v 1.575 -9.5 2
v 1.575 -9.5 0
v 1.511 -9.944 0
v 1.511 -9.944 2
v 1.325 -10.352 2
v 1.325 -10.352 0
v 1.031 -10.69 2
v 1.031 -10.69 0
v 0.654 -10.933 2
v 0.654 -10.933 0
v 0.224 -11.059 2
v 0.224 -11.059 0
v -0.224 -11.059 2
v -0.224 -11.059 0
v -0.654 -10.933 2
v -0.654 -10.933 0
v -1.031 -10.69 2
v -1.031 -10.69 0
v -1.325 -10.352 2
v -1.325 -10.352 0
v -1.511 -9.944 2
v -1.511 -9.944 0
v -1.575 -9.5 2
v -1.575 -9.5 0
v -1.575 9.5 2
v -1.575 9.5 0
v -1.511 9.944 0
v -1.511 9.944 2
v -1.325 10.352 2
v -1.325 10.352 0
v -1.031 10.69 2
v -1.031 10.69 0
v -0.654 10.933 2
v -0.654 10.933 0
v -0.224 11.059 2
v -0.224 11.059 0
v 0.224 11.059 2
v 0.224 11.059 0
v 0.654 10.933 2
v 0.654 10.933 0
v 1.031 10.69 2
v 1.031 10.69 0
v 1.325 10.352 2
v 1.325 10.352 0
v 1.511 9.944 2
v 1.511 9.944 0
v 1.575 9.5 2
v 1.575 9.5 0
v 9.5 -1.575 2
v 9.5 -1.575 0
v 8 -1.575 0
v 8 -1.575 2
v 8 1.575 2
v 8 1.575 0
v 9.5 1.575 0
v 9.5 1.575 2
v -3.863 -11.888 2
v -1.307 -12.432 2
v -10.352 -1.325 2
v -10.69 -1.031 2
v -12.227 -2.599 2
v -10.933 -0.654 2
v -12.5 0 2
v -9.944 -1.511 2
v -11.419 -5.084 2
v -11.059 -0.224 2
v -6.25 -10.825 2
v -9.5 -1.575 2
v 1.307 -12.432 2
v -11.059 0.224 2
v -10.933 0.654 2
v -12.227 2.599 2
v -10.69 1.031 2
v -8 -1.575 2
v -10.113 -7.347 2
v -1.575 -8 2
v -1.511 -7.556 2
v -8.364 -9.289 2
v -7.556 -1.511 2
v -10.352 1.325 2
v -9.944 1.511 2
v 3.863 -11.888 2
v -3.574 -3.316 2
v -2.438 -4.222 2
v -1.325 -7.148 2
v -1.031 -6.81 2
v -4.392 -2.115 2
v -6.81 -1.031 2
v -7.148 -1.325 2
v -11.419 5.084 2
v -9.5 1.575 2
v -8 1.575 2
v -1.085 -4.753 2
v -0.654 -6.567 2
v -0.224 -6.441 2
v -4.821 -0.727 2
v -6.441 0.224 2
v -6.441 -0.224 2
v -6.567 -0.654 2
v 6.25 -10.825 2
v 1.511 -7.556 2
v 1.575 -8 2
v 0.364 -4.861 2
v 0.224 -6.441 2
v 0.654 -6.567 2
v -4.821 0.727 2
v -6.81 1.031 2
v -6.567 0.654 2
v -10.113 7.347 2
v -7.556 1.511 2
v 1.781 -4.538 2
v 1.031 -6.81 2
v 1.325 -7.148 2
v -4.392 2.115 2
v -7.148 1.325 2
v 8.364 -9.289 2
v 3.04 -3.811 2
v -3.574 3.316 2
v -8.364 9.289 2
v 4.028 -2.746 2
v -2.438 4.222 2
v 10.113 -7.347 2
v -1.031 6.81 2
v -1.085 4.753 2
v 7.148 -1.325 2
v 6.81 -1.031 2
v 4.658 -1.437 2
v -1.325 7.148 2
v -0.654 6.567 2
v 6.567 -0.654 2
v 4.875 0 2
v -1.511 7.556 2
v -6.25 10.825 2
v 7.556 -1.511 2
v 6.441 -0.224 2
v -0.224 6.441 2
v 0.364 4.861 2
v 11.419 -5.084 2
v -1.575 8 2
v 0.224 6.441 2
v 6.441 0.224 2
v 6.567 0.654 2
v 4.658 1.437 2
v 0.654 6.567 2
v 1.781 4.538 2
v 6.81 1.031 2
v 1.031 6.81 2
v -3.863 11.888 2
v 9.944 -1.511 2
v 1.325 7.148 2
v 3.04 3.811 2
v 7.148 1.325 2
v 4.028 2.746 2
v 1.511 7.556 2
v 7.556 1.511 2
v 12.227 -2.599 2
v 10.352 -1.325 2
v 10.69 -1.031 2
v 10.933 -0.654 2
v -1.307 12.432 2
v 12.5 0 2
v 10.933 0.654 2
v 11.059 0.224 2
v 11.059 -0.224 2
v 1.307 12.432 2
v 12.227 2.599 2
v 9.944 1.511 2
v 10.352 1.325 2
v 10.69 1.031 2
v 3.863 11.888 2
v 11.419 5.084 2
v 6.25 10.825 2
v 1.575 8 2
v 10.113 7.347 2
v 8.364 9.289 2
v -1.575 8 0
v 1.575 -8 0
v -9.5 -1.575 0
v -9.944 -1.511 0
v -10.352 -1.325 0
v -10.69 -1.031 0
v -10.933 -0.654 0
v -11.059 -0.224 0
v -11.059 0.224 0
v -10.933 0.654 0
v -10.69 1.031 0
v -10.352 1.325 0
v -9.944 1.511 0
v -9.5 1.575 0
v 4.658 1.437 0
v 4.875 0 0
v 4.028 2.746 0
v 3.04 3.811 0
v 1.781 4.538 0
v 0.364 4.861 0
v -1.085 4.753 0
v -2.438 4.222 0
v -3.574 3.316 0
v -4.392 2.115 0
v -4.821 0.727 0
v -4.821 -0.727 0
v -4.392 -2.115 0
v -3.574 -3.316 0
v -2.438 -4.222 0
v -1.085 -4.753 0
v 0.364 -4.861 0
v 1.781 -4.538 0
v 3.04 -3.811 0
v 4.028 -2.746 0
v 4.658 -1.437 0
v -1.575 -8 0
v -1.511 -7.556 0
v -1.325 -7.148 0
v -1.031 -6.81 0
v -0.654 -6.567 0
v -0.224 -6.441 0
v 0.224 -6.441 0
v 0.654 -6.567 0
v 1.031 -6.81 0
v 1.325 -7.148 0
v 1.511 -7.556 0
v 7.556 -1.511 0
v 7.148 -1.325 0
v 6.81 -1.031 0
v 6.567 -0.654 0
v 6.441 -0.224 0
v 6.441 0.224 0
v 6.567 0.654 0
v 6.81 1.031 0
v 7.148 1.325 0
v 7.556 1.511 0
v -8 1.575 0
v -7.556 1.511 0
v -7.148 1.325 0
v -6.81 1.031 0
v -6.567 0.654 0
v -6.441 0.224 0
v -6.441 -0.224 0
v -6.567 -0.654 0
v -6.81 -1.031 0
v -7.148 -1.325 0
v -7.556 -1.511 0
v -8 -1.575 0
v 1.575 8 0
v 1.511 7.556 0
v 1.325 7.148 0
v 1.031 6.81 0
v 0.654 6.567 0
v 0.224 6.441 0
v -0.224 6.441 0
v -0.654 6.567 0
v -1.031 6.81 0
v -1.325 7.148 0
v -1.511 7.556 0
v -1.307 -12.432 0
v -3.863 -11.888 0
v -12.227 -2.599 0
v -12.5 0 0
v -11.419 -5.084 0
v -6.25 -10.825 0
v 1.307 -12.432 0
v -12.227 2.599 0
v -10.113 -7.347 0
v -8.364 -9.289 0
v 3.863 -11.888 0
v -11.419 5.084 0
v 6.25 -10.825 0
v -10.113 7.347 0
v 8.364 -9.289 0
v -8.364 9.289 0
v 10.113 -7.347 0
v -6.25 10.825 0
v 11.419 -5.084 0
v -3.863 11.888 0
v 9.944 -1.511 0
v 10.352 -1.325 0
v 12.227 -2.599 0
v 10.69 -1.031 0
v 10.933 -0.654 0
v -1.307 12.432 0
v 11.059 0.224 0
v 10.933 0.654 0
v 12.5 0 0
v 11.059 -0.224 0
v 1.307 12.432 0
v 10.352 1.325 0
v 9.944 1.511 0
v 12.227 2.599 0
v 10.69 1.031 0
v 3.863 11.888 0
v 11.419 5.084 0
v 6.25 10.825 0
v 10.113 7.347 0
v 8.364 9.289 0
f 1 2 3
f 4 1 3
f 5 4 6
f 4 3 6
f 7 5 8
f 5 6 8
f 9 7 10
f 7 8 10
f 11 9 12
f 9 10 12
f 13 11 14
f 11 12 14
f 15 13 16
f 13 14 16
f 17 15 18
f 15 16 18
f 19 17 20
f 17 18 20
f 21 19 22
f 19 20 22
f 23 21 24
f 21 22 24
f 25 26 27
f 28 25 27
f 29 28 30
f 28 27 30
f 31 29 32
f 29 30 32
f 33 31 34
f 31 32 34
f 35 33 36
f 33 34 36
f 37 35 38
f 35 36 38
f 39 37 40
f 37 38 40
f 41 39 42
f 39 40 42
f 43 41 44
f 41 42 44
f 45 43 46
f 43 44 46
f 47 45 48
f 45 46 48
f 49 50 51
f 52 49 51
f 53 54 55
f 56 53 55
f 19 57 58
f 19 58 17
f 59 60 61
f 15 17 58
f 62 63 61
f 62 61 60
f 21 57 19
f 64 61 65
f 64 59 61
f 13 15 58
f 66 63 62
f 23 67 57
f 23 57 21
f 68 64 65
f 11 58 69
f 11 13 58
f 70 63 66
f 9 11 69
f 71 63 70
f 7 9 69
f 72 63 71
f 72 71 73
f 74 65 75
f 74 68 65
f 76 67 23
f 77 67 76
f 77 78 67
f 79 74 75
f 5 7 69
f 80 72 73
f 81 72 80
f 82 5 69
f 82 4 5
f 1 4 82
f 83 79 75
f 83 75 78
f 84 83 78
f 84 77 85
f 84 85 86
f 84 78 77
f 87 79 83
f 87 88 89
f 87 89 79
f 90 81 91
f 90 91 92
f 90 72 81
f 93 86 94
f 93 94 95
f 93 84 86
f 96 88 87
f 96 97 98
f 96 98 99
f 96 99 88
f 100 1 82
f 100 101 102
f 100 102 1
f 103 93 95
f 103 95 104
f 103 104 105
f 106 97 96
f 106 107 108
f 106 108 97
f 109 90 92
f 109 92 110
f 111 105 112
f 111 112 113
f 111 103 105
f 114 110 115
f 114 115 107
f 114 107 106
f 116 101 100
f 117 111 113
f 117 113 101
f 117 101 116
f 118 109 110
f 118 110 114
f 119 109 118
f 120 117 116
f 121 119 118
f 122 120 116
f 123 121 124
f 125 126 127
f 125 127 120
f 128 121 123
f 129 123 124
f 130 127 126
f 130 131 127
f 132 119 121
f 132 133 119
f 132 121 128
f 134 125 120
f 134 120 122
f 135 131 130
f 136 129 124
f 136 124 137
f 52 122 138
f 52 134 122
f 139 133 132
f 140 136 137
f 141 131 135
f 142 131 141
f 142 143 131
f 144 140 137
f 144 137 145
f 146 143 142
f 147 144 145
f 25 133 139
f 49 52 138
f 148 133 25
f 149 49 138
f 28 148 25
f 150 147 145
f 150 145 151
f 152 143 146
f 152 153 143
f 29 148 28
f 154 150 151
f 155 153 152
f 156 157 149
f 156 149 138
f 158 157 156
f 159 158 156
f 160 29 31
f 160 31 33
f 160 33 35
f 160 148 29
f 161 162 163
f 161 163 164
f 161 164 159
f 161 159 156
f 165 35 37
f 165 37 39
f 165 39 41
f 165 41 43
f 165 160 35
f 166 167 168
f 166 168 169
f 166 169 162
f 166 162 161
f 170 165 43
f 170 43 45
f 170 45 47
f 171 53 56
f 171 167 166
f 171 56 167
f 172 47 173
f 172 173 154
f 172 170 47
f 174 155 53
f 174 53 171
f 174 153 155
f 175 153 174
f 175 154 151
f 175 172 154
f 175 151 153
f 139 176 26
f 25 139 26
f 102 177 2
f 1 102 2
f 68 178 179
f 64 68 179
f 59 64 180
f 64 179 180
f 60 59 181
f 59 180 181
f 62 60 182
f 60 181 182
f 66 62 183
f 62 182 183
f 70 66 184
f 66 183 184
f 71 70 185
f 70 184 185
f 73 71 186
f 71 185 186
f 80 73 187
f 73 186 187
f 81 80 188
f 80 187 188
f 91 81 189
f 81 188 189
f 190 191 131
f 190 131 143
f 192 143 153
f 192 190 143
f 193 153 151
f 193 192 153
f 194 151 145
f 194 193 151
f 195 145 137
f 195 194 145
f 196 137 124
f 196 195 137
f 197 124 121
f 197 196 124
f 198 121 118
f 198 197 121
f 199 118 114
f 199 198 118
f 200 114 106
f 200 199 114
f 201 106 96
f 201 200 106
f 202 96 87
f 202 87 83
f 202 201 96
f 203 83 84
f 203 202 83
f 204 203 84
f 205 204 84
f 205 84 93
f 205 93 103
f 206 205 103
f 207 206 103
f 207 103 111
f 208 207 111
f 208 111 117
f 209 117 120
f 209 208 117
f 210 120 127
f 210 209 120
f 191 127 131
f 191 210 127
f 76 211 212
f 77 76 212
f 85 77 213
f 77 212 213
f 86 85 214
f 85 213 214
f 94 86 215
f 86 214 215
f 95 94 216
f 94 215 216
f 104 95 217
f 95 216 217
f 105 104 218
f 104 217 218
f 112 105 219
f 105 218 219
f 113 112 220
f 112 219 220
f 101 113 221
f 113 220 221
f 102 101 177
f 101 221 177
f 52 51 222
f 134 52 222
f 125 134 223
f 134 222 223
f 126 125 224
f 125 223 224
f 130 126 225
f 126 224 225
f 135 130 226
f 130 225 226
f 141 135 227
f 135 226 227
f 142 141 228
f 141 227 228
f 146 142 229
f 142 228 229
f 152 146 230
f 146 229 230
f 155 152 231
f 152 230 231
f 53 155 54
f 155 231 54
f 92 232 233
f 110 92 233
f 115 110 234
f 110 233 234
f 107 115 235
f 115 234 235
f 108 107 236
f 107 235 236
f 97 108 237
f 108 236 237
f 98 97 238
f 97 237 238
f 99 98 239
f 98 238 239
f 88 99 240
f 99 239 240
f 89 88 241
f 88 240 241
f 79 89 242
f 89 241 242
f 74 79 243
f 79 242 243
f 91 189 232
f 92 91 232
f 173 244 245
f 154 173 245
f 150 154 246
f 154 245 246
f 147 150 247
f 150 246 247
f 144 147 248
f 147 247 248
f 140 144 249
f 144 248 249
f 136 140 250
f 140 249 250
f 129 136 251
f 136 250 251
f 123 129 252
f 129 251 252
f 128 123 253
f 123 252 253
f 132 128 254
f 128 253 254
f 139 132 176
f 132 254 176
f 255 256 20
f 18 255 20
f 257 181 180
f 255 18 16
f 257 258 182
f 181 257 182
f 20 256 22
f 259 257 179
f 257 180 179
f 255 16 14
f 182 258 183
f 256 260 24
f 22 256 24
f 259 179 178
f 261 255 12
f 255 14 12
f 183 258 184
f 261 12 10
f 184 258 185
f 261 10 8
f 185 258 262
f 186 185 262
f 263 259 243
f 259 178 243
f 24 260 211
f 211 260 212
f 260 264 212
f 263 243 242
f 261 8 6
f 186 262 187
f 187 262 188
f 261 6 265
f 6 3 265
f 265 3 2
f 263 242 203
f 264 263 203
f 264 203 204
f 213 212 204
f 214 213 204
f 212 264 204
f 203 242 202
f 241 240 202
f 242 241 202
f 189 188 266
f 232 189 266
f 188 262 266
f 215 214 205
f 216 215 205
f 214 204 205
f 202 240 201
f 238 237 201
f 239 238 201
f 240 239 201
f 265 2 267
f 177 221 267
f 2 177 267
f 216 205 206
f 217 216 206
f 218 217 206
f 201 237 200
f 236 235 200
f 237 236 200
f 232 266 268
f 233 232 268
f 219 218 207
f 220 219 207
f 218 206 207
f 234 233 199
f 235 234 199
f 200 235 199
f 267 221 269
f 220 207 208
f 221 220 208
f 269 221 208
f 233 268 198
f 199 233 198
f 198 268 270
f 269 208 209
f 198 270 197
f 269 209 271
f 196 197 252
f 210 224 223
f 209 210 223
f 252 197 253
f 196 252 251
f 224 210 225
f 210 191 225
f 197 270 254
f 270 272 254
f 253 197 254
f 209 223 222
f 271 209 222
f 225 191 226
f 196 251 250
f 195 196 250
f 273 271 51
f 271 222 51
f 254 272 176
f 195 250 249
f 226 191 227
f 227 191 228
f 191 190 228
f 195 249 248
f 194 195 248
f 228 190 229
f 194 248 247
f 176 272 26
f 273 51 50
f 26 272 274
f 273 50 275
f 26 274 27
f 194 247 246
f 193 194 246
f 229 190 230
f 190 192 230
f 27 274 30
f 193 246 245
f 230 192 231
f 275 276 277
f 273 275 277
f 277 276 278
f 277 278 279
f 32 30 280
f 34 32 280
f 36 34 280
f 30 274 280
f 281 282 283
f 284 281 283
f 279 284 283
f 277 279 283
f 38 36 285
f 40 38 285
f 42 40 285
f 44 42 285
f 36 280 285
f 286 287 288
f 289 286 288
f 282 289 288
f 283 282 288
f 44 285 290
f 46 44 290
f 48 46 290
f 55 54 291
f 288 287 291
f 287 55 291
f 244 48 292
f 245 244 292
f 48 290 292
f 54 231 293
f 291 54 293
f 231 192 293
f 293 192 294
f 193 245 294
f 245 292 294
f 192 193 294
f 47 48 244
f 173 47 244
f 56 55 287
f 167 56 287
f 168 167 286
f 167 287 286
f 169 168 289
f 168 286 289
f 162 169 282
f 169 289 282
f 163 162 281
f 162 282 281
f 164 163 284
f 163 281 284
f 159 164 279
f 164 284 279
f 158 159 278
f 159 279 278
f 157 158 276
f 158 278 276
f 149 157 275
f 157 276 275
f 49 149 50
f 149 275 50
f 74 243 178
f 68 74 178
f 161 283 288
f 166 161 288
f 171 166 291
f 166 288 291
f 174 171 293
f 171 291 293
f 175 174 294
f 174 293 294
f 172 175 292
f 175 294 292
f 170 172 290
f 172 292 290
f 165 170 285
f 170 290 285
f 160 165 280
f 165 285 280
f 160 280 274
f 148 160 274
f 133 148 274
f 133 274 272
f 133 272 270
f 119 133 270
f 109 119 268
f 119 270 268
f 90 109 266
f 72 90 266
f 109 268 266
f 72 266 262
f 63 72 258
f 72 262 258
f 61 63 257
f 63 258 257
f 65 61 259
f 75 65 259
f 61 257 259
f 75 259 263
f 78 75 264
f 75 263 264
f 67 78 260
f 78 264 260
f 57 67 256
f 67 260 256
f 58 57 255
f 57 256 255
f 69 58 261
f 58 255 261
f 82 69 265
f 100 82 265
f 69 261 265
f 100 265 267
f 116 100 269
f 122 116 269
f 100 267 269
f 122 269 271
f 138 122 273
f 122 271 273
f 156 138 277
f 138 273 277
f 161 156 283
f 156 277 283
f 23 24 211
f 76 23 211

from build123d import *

# Parameters (mm, degrees)
F0_R     = 12.5
F0_R_2   = 4.875
F1_DEPTH = 2


with BuildPart() as f1:
    # F0 (on Top) → F1 (new body)
    with BuildSketch(Plane.XY):
        Circle(F0_R)
        with BuildLine():
            ThreePointArc((-1.575, -8), (0, -6.425), (1.575, -8))
            Line((1.575, -8), (1.575, -9.5))
            ThreePointArc((1.575, -9.5), (0, -11.075), (-1.575, -9.5))
            Line((-1.575, -9.5), (-1.575, -8))
        make_face(mode=Mode.SUBTRACT)
        with BuildLine():
            ThreePointArc((-9.5, -1.575), (-11.075, 0), (-9.5, 1.575))
            Line((-9.5, 1.575), (-8, 1.575))
            ThreePointArc((-8, 1.575), (-6.425, 0), (-8, -1.575))
            Line((-8, -1.575), (-9.5, -1.575))
        make_face(mode=Mode.SUBTRACT)
        Circle(F0_R_2, mode=Mode.SUBTRACT)
        with BuildLine():
            Line((9.5, -1.575), (8, -1.575))
            ThreePointArc((8, -1.575), (6.425, 0), (8, 1.575))
            Line((8, 1.575), (9.5, 1.575))
            ThreePointArc((9.5, 1.575), (11.075, 0), (9.5, -1.575))
        make_face(mode=Mode.SUBTRACT)
        with BuildLine():
            Line((1.575, 9.5), (1.575, 8))
            ThreePointArc((1.575, 8), (0, 6.425), (-1.575, 8))
            Line((-1.575, 8), (-1.575, 9.5))
            ThreePointArc((-1.575, 9.5), (0, 11.075), (1.575, 9.5))
        make_face(mode=Mode.SUBTRACT)
    extrude(amount=F1_DEPTH)


solid = f1.part
